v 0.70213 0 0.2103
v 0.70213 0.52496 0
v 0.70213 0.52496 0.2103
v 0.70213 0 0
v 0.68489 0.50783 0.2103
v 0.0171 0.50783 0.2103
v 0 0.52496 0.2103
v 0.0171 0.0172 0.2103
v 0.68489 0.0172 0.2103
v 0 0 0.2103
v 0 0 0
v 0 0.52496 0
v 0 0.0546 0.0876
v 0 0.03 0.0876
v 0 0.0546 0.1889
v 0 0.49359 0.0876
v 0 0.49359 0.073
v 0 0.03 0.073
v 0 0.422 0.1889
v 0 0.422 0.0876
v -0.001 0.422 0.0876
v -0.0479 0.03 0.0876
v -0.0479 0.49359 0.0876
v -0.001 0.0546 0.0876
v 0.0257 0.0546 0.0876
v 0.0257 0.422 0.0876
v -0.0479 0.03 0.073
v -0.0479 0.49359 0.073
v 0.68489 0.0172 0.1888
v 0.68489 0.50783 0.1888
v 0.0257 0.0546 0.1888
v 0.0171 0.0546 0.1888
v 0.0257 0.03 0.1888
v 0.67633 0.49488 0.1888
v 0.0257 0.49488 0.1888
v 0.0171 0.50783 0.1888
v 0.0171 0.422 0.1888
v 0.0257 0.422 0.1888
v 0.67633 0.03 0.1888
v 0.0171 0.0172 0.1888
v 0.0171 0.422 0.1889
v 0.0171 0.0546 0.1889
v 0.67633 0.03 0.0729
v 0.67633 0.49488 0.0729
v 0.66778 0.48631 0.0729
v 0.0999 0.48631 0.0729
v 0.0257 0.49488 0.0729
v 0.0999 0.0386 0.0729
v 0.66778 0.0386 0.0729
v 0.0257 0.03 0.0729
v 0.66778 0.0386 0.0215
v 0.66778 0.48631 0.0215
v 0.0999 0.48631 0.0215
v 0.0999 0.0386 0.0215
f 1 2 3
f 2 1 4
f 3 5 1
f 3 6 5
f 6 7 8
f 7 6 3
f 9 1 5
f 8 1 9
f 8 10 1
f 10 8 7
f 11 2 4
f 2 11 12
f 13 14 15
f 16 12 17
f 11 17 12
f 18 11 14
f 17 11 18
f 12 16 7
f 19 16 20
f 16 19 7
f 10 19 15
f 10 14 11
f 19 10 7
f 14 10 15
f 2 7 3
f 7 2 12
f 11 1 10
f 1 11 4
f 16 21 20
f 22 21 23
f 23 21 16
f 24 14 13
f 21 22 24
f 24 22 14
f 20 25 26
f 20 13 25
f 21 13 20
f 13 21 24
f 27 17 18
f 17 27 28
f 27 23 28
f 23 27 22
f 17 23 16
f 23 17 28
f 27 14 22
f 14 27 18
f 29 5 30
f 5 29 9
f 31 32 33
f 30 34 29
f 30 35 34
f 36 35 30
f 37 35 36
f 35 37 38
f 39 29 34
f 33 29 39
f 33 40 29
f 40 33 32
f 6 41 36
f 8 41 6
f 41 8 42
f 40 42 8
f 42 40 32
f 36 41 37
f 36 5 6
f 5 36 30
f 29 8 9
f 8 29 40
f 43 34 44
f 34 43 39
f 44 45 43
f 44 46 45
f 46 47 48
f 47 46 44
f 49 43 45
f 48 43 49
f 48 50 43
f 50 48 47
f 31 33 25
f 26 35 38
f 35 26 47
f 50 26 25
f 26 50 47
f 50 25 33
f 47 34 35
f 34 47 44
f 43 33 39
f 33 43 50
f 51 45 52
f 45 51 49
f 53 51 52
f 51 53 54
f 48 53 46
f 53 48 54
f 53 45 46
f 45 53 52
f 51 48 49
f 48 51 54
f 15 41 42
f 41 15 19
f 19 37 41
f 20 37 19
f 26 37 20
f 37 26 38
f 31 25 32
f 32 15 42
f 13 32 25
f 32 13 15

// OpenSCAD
// Parameters for the Main Body
body_length = 0.702127;
body_width  = 0.524964;
body_height = 0.2103;

// Parameters for Cut 1 (Shallow Top Recess)
cut1_length = 0.667793;
cut1_width  = 0.490631;
cut1_depth  = 0.0215;
cut1_x_offset = 0.0171;
cut1_y_offset = 0.0172;
cut1_z_offset = 0.1888;

// Parameters for Cut 2 (Contained Middle Cut)
cut2_length = 0.650626;
cut2_width  = 0.46488;
cut2_depth  = 0.1159;
cut2_x_offset = 0.0257;
cut2_y_offset = 0.03;
cut2_z_offset = 0.0729;

// Parameters for Cut 3 (Lower Pocket)
cut3_length = 0.567882;
cut3_width  = 0.447713;
cut3_depth  = 0.0515;
cut3_x_offset = 0.0999;
cut3_y_offset = 0.0386;
cut3_z_offset = 0.0215;

// Parameters for Addition 1 (Side Projection)
add1_length = 0.130618;
add1_width  = 0.463588;
add1_height = 0.0146;
add1_x_offset = -0.0479;
add1_y_offset = 0.03;
add1_z_offset = 0.073;

// Parameters for Cut 4 (Side Recess)
cut4_length = 0.0343;
cut4_width  = 0.3674;
cut4_depth  = 0.1013;
cut4_x_offset = 0;
cut4_y_offset = 0.0546;
cut4_z_offset = 0.0876;

// Epsilon for avoiding Z-fighting in boolean operations
eps = 0.001;

// Main Geometry
difference() {
    // Base solid and additions
    union() {
        // Main reference body
        cube([body_length, body_width, body_height]);
        
        // Solid rectangular side projection
        translate([add1_x_offset, add1_y_offset, add1_z_offset])
            cube([add1_length, add1_width, add1_height]);
    }
    
    // Subtractive cuts
    
    // Cut 1: Shallow rectangular recess from the top
    translate([cut1_x_offset, cut1_y_offset, cut1_z_offset])
        cube([cut1_length, cut1_width, cut1_depth + eps]);
        
    // Cut 2: Contained rectangular cut continuing downward
    // Adding eps to depth to ensure clean overlap with Cut 1
    translate([cut2_x_offset, cut2_y_offset, cut2_z_offset])
        cube([cut2_length, cut2_width, cut2_depth + eps]);
        
    // Cut 3: Lower, more offset rectangular pocket
    // Adding eps to depth to ensure clean overlap with Cut 2
    translate([cut3_x_offset, cut3_y_offset, cut3_z_offset])
        cube([cut3_length, cut3_width, cut3_depth + eps]);
        
    // Cut 4: Associated side recess at the left edge
    // Extending slightly in X to cleanly cut the left edge
    translate([cut4_x_offset - eps, cut4_y_offset, cut4_z_offset])
        cube([cut4_length + eps, cut4_width, cut4_depth]);
}
